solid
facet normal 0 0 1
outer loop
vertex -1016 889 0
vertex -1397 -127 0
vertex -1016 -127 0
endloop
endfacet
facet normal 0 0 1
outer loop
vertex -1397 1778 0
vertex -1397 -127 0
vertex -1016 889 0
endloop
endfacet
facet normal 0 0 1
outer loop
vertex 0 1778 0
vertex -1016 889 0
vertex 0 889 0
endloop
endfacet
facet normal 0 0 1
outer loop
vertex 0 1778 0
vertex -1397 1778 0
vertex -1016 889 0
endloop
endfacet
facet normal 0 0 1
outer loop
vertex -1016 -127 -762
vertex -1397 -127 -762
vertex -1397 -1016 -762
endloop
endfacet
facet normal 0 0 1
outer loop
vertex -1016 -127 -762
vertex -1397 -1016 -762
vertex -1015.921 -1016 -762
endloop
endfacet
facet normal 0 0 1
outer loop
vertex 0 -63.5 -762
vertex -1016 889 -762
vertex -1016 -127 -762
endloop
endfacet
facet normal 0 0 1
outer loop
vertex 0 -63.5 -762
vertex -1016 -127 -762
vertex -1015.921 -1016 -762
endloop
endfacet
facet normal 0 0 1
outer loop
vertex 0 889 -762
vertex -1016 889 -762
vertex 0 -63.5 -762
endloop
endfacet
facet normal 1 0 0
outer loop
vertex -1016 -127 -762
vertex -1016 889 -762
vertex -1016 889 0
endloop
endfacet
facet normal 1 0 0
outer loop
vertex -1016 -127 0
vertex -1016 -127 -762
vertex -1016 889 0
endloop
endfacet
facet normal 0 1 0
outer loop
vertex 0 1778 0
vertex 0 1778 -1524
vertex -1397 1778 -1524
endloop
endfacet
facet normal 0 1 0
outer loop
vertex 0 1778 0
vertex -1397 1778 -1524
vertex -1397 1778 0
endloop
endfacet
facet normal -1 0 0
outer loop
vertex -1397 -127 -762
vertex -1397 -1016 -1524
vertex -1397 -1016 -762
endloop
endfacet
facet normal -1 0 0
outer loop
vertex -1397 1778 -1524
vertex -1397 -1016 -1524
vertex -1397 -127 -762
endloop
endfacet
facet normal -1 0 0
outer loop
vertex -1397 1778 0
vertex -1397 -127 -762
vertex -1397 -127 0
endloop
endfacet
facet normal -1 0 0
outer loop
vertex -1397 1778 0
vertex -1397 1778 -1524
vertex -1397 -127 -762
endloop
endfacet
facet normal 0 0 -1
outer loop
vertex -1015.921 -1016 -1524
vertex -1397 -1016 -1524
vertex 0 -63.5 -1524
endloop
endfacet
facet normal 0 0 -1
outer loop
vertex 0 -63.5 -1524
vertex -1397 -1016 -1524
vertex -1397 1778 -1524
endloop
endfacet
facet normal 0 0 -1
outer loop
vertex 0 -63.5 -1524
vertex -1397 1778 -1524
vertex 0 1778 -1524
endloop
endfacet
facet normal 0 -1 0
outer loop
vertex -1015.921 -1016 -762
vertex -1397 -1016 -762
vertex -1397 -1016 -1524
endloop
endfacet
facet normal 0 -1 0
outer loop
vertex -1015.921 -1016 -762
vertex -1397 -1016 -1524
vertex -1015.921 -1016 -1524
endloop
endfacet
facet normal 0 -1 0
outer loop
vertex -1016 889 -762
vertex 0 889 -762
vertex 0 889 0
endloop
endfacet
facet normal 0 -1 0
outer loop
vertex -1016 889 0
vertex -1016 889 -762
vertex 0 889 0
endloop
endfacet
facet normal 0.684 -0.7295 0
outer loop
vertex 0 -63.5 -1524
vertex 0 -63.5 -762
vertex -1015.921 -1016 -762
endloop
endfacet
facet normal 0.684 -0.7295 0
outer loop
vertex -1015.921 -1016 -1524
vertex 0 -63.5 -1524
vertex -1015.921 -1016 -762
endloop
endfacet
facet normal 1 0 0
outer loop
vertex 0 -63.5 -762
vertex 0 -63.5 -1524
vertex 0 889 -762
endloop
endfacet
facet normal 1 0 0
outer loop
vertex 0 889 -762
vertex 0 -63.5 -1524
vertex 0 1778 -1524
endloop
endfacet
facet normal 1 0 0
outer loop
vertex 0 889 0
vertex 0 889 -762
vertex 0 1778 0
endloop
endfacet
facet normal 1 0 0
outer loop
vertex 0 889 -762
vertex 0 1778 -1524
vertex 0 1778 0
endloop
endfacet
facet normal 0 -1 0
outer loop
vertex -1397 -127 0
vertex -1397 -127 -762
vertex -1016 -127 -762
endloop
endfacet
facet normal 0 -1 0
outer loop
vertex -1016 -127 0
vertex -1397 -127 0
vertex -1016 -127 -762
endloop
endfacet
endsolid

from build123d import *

# Parameters (mm, degrees)
F0_W     = 1778
F0_H     = 1524
F2_DEPTH = 1397
F1_W     = 889
F1_H     = 762
F3_DEPTH = 1755.14
F4_W     = 1397
F4_H     = 762
F5_DEPTH = 1016
F7_DEPTH = 1226.82
F8_W     = 381
F8_H     = 762
F9_DEPTH = 1016


with BuildPart() as f2:
    # F0 (on Right) → F2 (new body)
    with BuildSketch(Plane.YZ):
        with Locations((889, -762)):
            Rectangle(F0_W, F0_H)
    extrude(amount=-F2_DEPTH)

    # F1 (on face) → F3 (cut)
    with BuildSketch(Plane.YZ):
        with Locations((444.5, -381)):
            Rectangle(F1_W, F1_H)
    extrude(amount=-F3_DEPTH, mode=Mode.SUBTRACT)

    # F4 (on face) → F5 (join)
    with BuildSketch(Plane.XZ):
        with Locations((-698.5, -1143)):
            Rectangle(F4_W, F4_H)
    extrude(amount=F5_DEPTH)

    # F6 (on face) → F7 (cut)
    with BuildSketch(Plane.XY.offset(-762)):
        Polygon((0, -1016), (0, -63.5), (-1015.920877, -1016), align=None)
    extrude(amount=-F7_DEPTH, mode=Mode.SUBTRACT)

    # F8 (on face) → F9 (join)
    with BuildSketch(Plane.XZ.offset(-889)):
        with Locations((-1206.5, -381)):
            Rectangle(F8_W, F8_H)
    extrude(amount=F9_DEPTH)


solid = f2.part
